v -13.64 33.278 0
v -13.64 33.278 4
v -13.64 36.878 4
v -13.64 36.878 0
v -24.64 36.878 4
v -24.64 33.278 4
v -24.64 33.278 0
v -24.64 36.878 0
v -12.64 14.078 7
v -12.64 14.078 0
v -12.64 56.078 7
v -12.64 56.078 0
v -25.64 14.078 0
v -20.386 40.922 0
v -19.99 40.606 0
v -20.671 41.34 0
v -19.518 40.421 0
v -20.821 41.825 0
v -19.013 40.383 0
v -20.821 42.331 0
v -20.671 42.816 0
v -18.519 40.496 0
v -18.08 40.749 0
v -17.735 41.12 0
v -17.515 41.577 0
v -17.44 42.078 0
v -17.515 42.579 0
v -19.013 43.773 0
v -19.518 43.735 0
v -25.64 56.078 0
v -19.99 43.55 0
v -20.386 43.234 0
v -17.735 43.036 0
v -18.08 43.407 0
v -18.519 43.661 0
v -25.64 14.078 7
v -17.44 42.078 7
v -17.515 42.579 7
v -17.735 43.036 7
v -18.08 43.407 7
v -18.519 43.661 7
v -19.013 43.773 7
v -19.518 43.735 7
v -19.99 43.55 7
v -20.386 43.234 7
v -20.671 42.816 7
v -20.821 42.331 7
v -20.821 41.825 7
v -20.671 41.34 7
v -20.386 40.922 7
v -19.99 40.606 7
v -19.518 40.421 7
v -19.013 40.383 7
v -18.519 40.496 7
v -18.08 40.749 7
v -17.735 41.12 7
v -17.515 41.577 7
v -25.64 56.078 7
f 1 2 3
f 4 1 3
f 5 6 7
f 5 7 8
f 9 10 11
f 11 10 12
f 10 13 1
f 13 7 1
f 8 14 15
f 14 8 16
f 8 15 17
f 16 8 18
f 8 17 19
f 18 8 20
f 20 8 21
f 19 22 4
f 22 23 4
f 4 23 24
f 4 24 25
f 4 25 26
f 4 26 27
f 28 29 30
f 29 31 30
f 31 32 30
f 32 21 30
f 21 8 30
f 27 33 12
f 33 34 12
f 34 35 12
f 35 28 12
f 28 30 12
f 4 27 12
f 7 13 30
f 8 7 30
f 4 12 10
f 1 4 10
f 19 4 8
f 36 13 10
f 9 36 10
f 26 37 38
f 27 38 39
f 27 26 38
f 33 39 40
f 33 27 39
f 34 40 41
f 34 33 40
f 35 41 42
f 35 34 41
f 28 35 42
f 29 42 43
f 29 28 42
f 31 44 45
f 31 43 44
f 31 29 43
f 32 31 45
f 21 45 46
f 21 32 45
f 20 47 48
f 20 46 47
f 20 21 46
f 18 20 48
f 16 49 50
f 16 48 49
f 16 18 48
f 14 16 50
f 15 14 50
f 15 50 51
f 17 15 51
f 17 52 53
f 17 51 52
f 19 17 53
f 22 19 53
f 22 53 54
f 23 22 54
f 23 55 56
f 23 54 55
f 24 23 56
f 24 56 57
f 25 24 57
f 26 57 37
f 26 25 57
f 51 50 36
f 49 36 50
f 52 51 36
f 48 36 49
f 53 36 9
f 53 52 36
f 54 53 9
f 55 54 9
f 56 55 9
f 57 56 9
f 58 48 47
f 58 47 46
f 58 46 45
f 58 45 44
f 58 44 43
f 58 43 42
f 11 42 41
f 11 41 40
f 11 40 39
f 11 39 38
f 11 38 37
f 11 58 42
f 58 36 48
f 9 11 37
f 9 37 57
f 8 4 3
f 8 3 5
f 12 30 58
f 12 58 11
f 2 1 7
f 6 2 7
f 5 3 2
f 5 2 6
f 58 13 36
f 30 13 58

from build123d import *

# Parameters (mm, degrees)
SKETCH1_W           = 13
SKETCH1_H           = 42
BOSS_EXTRUDE1_DEPTH = 7
SKETCH2_W           = 11
SKETCH2_H           = 3.6
CUT_EXTRUDE1_DEPTH  = 4
SKETCH3_R           = 1.7
CUT_EXTRUDE2_DEPTH  = 10


with BuildPart() as part:
    # Sketch1 → Boss-Extrude1 (new body)
    with BuildSketch(Plane.XY):
        with Locations((-19.139592704, 35.078039657)):
            Rectangle(SKETCH1_W, SKETCH1_H)
    extrude(amount=BOSS_EXTRUDE1_DEPTH)

    # Sketch2 → Cut-Extrude1 (cut)
    with BuildSketch(Plane(origin=(0, 0, 0), x_dir=(-1, 0, 0), z_dir=(0, 0, -1))):
        with Locations((19.139592704, 35.078039657)):
            Rectangle(SKETCH2_W, SKETCH2_H)
    extrude(amount=-CUT_EXTRUDE1_DEPTH, mode=Mode.SUBTRACT)

    # Sketch3 → Cut-Extrude2 (cut)
    with BuildSketch(Plane.XY):
        with Locations((-19.139592704, 42.078039657)):
            Circle(SKETCH3_R)
    extrude(amount=CUT_EXTRUDE2_DEPTH, mode=Mode.SUBTRACT)


solid = part.part
